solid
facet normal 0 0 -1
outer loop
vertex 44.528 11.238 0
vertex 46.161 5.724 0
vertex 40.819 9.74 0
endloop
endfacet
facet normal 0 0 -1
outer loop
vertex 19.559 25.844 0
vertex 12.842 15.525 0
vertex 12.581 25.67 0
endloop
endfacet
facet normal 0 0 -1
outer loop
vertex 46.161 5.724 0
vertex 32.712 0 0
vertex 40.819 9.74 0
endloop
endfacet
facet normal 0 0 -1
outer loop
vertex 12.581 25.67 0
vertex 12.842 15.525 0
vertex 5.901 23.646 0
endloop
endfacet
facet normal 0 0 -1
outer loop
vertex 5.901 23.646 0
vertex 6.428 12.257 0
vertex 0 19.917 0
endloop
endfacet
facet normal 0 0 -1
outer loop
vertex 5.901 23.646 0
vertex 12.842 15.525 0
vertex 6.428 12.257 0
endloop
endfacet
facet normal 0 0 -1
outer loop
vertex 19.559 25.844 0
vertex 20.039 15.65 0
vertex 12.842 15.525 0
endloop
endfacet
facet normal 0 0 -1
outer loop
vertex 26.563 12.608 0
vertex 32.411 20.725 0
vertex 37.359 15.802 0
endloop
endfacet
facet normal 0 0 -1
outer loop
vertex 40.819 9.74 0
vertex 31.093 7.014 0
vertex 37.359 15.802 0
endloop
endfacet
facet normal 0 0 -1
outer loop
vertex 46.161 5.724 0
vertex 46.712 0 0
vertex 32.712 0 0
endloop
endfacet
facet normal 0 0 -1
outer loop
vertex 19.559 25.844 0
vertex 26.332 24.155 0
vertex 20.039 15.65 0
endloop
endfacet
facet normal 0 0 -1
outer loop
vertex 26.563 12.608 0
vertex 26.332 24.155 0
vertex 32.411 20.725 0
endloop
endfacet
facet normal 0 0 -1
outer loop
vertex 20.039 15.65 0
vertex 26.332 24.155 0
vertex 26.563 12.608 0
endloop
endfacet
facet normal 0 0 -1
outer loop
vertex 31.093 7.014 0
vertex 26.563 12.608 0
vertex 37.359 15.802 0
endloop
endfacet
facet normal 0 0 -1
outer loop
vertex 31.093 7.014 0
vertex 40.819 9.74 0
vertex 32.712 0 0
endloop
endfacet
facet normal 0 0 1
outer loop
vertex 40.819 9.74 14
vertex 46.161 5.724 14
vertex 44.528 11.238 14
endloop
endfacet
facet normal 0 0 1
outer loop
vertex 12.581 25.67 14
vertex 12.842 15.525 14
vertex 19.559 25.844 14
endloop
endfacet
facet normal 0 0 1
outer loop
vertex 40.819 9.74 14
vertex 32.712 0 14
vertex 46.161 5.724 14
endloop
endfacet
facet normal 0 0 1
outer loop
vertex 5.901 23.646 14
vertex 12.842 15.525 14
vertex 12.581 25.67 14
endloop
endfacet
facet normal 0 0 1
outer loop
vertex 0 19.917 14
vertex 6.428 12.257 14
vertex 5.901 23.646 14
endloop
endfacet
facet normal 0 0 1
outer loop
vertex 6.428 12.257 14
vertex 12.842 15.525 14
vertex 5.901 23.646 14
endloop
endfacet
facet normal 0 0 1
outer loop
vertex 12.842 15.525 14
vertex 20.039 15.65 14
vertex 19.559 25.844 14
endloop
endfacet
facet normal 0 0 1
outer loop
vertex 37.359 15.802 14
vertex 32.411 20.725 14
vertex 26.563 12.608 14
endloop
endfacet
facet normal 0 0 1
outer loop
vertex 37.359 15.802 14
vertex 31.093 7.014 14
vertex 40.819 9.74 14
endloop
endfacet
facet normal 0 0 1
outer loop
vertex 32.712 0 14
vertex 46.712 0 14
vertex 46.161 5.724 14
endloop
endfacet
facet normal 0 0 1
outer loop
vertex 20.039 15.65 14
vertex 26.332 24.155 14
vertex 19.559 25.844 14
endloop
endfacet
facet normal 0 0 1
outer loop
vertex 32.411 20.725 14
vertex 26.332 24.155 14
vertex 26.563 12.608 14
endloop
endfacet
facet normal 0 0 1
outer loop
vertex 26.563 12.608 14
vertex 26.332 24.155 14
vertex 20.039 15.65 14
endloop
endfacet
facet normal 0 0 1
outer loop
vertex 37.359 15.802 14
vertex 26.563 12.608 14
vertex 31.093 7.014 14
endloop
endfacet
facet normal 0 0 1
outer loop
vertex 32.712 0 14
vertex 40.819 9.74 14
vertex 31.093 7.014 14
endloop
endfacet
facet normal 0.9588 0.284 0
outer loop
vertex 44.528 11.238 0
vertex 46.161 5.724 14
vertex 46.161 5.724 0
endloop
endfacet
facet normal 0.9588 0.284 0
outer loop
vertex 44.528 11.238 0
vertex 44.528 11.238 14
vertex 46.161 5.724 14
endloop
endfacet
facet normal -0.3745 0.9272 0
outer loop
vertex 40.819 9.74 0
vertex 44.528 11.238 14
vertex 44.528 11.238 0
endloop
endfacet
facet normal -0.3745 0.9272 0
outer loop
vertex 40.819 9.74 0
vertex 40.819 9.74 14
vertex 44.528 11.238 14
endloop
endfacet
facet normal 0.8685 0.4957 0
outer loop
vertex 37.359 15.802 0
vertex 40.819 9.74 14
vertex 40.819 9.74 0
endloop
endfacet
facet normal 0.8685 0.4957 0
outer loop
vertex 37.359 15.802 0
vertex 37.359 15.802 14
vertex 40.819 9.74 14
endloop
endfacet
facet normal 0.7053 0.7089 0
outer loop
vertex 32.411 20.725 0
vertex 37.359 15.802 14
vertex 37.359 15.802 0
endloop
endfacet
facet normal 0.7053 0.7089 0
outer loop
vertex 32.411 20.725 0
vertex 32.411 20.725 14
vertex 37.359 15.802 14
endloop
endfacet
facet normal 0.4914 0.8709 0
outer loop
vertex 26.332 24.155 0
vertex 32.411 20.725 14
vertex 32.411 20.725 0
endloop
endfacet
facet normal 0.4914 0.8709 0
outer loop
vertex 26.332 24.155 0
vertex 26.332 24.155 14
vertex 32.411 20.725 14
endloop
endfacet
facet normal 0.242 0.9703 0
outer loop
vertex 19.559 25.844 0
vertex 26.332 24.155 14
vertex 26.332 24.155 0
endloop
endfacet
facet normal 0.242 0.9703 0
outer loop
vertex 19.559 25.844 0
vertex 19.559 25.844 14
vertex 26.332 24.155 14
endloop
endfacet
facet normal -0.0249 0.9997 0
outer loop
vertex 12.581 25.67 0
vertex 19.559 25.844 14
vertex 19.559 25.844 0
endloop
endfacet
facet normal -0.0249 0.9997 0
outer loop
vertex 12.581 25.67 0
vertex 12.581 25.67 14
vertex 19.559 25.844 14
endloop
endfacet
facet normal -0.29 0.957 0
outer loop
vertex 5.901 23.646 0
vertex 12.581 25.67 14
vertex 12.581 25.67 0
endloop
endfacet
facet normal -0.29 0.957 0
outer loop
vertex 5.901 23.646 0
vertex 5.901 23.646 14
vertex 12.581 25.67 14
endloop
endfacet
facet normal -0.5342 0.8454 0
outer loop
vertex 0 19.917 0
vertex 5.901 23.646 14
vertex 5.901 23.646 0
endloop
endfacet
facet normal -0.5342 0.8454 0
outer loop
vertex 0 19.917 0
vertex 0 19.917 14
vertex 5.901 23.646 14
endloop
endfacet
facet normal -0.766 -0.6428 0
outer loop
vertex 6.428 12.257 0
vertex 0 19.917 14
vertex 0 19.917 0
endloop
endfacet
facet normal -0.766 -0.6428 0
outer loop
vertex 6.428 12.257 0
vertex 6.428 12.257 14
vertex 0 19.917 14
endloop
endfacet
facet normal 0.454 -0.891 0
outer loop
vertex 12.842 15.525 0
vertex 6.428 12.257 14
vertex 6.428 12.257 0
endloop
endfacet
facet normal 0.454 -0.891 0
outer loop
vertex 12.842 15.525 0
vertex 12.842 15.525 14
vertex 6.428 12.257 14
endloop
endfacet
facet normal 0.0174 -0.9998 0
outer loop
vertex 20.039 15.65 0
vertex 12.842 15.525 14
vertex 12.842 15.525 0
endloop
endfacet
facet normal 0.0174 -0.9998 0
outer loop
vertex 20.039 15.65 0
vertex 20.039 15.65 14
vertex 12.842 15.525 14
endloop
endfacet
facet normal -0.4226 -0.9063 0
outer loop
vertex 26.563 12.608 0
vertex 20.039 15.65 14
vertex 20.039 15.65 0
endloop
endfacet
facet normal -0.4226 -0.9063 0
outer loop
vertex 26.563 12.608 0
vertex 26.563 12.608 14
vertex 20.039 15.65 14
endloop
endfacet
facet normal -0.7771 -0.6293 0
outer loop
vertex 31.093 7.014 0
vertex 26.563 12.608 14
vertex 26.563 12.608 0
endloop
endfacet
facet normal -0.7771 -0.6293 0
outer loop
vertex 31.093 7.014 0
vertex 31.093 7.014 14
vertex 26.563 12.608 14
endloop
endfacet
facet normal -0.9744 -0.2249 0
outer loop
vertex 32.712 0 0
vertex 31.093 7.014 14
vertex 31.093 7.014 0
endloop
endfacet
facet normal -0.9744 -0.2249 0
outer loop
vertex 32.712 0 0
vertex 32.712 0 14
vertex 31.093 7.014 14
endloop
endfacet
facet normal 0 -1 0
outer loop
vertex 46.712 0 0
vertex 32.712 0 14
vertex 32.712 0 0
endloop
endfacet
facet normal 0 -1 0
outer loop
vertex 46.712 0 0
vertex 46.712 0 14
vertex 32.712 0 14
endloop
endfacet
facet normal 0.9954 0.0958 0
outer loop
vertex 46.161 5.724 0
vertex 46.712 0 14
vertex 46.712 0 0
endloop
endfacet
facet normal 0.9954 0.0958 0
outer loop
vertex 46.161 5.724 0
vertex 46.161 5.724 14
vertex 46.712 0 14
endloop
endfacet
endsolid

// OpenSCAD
$fn = 32;

// ----------------------------------------------------------------------
// Arc stop: segment, 14 mm thick
// ----------------------------------------------------------------------

// --- parameters (mm) ---
profile_height = 14;      // extrusion height
profile_points = 17;      // points of the closed outline

profile = [[46.712, 0], [46.161, 5.724], [44.528, 11.238], [40.819, 9.74], [37.359, 15.802], [32.411, 20.725], [26.332, 24.155], [19.559, 25.844], [12.581, 25.67], [5.901, 23.646], [0, 19.917], [6.428, 12.257], [12.842, 15.525], [20.039, 15.65], [26.563, 12.608], [31.093, 7.014], [32.712, 0]];  // single closed polygon, 17 points, counter clockwise

// --- the one profile operation ---
linear_extrude(height = profile_height) polygon(points = profile);
